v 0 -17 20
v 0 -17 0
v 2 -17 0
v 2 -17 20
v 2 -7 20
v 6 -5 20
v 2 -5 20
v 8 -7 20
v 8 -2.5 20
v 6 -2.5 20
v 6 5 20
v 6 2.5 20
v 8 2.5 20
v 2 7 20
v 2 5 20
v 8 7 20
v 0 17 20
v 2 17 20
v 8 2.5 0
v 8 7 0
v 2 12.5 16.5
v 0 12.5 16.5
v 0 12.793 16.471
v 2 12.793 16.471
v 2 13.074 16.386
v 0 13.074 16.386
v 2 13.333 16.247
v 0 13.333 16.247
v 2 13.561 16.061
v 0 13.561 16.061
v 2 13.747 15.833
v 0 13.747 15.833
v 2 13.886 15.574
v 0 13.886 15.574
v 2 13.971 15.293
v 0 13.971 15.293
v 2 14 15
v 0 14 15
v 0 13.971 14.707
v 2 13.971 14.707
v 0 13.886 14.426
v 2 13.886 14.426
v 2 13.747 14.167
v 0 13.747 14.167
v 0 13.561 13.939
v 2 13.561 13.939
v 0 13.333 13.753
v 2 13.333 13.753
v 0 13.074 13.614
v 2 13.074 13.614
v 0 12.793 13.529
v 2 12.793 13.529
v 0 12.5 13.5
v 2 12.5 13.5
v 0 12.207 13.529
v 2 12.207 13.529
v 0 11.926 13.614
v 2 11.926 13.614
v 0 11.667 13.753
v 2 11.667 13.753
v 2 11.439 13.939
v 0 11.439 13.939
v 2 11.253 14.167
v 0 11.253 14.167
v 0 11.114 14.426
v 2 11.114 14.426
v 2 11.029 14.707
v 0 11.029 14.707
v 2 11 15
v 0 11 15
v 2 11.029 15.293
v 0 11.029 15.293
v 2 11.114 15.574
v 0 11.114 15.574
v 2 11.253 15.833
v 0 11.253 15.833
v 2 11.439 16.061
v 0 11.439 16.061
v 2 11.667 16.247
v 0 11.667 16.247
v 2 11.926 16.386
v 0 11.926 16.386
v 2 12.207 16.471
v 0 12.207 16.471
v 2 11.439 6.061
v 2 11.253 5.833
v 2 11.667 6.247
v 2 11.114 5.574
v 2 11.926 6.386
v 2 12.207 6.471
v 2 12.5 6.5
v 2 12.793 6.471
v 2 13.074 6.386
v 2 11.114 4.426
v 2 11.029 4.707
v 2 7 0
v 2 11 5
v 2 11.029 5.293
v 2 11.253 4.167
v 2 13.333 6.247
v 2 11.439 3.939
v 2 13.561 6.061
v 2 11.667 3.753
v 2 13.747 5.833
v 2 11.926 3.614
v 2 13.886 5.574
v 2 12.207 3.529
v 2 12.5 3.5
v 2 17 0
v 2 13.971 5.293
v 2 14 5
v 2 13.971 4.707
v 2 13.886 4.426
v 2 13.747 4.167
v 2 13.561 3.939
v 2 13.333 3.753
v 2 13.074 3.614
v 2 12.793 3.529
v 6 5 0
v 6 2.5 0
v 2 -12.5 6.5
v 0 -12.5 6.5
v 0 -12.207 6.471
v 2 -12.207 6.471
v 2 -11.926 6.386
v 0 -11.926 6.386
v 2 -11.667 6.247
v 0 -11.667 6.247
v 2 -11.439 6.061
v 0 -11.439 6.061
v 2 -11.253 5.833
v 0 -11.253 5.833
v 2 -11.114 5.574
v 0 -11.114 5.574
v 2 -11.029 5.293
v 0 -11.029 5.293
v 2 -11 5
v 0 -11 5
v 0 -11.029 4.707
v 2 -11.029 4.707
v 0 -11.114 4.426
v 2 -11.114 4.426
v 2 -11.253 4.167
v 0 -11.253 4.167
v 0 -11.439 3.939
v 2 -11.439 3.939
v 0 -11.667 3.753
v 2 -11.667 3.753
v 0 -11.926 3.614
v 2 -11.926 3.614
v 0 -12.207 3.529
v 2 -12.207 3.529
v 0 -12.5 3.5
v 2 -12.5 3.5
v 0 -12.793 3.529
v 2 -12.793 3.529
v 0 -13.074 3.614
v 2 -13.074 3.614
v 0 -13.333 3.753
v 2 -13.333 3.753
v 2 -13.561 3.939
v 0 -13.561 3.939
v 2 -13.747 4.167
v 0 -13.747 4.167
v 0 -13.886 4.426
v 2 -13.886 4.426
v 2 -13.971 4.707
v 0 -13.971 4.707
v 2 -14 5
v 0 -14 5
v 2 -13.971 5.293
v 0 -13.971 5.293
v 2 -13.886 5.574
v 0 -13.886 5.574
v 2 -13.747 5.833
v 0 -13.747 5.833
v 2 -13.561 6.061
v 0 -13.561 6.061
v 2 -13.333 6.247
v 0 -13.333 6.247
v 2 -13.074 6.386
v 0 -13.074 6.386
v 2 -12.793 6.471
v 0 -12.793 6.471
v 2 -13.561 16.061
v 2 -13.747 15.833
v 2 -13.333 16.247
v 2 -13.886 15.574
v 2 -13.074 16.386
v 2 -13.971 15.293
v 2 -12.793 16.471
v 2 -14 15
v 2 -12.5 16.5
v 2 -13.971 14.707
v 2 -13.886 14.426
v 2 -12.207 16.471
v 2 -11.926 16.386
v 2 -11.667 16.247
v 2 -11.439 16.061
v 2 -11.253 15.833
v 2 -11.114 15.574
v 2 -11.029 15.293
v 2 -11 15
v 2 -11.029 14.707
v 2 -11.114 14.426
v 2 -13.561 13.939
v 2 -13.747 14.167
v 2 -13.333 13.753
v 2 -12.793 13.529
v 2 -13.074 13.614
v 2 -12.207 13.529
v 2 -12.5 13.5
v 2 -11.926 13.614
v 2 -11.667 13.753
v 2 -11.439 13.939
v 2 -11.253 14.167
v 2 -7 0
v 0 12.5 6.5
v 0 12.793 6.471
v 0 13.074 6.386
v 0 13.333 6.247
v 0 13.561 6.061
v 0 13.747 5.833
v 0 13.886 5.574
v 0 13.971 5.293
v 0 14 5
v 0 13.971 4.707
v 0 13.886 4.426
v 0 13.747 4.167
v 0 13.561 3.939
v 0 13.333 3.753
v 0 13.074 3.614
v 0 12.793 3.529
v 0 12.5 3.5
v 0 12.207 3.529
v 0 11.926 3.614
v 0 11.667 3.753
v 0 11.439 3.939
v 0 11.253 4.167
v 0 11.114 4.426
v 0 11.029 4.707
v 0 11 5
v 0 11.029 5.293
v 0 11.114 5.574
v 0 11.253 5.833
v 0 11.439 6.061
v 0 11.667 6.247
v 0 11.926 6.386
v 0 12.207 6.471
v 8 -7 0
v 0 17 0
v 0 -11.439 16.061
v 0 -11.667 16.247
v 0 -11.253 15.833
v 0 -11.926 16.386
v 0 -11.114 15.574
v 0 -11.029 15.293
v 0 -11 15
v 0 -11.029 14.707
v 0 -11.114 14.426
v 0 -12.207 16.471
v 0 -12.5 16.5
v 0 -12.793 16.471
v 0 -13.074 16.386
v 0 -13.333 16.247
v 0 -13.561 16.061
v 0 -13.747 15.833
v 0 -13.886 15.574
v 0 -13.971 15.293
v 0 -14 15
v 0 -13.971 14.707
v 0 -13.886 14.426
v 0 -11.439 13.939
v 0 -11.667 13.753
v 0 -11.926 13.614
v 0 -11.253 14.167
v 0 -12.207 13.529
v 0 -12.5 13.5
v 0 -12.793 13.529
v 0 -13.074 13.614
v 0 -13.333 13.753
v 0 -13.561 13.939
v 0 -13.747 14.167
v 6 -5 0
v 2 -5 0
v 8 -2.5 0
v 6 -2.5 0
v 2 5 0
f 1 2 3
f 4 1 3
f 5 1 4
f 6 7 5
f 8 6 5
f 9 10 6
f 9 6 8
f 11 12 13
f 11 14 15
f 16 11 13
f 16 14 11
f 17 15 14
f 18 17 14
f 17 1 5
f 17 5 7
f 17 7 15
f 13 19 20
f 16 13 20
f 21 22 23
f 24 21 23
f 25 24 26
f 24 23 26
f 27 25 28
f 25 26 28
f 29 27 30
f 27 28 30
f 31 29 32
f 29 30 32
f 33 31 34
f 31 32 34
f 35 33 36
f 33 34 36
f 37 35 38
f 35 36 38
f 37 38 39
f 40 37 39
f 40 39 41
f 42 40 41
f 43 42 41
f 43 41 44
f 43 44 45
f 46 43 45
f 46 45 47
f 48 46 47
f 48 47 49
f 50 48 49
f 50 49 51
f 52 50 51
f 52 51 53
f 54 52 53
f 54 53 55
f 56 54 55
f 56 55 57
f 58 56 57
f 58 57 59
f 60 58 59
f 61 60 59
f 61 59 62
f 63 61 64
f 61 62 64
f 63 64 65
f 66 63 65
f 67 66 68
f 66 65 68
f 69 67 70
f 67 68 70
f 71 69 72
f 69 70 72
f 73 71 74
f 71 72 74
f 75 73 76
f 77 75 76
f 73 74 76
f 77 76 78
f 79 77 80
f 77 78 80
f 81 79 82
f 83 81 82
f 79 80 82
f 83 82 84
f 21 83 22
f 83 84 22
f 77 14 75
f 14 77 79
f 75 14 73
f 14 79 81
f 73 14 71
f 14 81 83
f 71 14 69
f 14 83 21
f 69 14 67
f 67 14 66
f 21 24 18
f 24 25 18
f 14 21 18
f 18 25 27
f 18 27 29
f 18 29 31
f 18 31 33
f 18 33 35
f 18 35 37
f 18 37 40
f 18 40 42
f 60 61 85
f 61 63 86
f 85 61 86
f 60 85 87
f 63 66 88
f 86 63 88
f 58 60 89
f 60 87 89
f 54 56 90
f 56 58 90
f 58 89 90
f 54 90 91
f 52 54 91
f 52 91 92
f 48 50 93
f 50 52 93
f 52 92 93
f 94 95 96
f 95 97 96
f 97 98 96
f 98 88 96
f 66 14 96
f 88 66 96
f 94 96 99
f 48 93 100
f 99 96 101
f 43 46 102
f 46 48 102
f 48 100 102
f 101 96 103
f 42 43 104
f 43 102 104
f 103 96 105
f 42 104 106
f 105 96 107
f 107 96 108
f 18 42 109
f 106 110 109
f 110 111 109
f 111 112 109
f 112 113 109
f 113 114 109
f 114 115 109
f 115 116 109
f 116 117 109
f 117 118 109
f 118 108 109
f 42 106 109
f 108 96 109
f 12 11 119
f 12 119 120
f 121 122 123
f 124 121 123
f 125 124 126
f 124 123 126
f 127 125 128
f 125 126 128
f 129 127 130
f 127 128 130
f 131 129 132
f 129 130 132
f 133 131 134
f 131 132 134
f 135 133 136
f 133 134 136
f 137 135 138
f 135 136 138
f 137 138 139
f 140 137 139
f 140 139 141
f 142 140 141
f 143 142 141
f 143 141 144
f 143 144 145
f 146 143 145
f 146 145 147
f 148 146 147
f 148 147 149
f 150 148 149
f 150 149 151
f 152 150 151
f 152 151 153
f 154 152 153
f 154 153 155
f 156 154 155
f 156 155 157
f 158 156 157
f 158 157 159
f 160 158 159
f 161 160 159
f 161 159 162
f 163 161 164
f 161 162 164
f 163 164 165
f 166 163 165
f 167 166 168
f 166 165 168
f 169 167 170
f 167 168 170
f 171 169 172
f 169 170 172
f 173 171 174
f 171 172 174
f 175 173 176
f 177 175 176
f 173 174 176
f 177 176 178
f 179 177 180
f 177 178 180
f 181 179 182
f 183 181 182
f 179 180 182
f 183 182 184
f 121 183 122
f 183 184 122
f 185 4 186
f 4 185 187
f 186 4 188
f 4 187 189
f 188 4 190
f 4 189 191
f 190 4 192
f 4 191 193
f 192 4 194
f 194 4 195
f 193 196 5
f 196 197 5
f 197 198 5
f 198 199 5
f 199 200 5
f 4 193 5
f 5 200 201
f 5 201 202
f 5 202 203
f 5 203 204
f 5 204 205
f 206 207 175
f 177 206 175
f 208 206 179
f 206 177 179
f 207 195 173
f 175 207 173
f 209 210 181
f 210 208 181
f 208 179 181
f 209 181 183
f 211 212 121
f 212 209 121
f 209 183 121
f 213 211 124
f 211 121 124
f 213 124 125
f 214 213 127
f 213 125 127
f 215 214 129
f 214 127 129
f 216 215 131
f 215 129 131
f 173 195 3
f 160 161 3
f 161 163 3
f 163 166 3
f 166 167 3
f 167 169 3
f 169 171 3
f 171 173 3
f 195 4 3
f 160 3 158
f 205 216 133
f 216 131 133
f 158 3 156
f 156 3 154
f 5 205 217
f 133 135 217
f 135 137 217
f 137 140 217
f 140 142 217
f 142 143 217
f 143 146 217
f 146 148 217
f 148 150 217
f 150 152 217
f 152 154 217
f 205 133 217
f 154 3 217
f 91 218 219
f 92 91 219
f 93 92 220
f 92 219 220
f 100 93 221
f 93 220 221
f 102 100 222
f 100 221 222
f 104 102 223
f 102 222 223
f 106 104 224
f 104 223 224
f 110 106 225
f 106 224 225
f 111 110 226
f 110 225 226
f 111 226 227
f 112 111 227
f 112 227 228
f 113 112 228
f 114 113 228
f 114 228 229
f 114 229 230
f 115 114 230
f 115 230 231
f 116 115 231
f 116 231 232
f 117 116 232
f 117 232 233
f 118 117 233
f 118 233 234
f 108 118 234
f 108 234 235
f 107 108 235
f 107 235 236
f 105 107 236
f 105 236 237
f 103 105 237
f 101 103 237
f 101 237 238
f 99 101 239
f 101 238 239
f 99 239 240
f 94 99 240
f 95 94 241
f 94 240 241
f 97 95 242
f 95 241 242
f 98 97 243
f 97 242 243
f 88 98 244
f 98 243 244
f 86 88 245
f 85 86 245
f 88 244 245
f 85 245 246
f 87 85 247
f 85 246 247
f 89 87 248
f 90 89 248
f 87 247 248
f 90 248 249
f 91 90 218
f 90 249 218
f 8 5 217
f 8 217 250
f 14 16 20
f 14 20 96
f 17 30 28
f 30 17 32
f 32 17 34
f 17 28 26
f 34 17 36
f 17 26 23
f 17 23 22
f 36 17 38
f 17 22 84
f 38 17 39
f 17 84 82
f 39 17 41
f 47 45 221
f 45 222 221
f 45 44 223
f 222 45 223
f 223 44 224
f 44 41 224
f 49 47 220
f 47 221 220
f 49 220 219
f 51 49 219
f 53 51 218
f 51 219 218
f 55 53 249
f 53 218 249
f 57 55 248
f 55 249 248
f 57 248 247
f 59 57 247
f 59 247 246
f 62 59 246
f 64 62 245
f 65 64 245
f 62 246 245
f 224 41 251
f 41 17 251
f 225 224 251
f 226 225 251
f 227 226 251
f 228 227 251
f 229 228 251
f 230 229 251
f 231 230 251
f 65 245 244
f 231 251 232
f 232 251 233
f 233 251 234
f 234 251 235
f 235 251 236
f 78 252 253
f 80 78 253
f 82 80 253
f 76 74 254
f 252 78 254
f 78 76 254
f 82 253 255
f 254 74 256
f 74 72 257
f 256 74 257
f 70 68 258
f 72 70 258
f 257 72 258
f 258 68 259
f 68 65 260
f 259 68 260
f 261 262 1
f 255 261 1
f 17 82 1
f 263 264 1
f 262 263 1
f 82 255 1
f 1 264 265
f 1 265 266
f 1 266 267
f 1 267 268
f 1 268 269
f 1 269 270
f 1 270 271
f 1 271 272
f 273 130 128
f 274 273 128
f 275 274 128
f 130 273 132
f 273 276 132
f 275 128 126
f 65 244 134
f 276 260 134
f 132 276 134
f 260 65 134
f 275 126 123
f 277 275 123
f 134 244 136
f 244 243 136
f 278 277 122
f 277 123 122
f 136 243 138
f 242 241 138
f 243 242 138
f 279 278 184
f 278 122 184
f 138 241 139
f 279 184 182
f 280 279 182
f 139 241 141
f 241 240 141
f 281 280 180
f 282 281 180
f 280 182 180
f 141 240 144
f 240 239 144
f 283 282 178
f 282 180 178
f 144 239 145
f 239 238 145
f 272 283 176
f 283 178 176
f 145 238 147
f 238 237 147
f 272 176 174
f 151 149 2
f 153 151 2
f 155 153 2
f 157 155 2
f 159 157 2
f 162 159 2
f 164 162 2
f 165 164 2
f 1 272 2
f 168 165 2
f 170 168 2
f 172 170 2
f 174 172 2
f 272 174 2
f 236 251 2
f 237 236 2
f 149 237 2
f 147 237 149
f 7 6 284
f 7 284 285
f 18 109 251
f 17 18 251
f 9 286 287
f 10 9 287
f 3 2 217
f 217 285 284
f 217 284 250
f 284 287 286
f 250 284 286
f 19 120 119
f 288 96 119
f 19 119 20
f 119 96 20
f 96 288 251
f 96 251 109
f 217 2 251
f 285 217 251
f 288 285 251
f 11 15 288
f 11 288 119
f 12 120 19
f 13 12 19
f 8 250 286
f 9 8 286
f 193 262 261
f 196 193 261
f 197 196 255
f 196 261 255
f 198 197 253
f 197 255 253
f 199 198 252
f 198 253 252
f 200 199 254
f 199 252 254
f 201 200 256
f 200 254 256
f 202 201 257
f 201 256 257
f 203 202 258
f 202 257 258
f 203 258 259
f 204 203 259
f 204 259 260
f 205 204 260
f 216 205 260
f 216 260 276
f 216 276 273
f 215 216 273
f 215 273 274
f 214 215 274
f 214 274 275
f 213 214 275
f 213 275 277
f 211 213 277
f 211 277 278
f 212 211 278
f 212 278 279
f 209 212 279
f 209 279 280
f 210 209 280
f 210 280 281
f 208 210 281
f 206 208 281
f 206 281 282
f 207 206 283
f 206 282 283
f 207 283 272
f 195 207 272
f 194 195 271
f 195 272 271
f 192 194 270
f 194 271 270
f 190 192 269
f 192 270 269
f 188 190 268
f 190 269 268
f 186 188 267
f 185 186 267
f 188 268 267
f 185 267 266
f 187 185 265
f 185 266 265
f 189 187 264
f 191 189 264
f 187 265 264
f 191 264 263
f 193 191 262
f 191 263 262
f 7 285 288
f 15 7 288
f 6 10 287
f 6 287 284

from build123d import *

# Parameters (mm, degrees)
MAIN_EXTRUSION_DEPTH = 20
WHOLES_R             = 1.5
WHOLE_REMOVAL_DEPTH  = 9


with BuildPart() as part:
    # Main → Main Extrusion (new body)
    with BuildSketch(Plane.XY):
        Polygon((0, 17), (0, -17), (2, -17), (2, -7), (8, -7), (8, -2.5), (6, -2.5), (6, -5), (2, -5), (2, 5), (6, 5), (6, 2.5), (8, 2.5), (8, 7), (2, 7), (2, 17), align=None)
    extrude(amount=MAIN_EXTRUSION_DEPTH)

    # Wholes → Whole Removal (cut, through all)
    with BuildSketch(Plane.ZY):
        with Locations((5, 12.5)):
            Circle(WHOLES_R)
        with Locations((5, -12.5)):
            Circle(WHOLES_R)
        with Locations((15, -12.5)):
            Circle(WHOLES_R)
        with Locations((15, 12.5)):
            Circle(WHOLES_R)
    extrude(amount=-WHOLE_REMOVAL_DEPTH, mode=Mode.SUBTRACT)


solid = part.part
